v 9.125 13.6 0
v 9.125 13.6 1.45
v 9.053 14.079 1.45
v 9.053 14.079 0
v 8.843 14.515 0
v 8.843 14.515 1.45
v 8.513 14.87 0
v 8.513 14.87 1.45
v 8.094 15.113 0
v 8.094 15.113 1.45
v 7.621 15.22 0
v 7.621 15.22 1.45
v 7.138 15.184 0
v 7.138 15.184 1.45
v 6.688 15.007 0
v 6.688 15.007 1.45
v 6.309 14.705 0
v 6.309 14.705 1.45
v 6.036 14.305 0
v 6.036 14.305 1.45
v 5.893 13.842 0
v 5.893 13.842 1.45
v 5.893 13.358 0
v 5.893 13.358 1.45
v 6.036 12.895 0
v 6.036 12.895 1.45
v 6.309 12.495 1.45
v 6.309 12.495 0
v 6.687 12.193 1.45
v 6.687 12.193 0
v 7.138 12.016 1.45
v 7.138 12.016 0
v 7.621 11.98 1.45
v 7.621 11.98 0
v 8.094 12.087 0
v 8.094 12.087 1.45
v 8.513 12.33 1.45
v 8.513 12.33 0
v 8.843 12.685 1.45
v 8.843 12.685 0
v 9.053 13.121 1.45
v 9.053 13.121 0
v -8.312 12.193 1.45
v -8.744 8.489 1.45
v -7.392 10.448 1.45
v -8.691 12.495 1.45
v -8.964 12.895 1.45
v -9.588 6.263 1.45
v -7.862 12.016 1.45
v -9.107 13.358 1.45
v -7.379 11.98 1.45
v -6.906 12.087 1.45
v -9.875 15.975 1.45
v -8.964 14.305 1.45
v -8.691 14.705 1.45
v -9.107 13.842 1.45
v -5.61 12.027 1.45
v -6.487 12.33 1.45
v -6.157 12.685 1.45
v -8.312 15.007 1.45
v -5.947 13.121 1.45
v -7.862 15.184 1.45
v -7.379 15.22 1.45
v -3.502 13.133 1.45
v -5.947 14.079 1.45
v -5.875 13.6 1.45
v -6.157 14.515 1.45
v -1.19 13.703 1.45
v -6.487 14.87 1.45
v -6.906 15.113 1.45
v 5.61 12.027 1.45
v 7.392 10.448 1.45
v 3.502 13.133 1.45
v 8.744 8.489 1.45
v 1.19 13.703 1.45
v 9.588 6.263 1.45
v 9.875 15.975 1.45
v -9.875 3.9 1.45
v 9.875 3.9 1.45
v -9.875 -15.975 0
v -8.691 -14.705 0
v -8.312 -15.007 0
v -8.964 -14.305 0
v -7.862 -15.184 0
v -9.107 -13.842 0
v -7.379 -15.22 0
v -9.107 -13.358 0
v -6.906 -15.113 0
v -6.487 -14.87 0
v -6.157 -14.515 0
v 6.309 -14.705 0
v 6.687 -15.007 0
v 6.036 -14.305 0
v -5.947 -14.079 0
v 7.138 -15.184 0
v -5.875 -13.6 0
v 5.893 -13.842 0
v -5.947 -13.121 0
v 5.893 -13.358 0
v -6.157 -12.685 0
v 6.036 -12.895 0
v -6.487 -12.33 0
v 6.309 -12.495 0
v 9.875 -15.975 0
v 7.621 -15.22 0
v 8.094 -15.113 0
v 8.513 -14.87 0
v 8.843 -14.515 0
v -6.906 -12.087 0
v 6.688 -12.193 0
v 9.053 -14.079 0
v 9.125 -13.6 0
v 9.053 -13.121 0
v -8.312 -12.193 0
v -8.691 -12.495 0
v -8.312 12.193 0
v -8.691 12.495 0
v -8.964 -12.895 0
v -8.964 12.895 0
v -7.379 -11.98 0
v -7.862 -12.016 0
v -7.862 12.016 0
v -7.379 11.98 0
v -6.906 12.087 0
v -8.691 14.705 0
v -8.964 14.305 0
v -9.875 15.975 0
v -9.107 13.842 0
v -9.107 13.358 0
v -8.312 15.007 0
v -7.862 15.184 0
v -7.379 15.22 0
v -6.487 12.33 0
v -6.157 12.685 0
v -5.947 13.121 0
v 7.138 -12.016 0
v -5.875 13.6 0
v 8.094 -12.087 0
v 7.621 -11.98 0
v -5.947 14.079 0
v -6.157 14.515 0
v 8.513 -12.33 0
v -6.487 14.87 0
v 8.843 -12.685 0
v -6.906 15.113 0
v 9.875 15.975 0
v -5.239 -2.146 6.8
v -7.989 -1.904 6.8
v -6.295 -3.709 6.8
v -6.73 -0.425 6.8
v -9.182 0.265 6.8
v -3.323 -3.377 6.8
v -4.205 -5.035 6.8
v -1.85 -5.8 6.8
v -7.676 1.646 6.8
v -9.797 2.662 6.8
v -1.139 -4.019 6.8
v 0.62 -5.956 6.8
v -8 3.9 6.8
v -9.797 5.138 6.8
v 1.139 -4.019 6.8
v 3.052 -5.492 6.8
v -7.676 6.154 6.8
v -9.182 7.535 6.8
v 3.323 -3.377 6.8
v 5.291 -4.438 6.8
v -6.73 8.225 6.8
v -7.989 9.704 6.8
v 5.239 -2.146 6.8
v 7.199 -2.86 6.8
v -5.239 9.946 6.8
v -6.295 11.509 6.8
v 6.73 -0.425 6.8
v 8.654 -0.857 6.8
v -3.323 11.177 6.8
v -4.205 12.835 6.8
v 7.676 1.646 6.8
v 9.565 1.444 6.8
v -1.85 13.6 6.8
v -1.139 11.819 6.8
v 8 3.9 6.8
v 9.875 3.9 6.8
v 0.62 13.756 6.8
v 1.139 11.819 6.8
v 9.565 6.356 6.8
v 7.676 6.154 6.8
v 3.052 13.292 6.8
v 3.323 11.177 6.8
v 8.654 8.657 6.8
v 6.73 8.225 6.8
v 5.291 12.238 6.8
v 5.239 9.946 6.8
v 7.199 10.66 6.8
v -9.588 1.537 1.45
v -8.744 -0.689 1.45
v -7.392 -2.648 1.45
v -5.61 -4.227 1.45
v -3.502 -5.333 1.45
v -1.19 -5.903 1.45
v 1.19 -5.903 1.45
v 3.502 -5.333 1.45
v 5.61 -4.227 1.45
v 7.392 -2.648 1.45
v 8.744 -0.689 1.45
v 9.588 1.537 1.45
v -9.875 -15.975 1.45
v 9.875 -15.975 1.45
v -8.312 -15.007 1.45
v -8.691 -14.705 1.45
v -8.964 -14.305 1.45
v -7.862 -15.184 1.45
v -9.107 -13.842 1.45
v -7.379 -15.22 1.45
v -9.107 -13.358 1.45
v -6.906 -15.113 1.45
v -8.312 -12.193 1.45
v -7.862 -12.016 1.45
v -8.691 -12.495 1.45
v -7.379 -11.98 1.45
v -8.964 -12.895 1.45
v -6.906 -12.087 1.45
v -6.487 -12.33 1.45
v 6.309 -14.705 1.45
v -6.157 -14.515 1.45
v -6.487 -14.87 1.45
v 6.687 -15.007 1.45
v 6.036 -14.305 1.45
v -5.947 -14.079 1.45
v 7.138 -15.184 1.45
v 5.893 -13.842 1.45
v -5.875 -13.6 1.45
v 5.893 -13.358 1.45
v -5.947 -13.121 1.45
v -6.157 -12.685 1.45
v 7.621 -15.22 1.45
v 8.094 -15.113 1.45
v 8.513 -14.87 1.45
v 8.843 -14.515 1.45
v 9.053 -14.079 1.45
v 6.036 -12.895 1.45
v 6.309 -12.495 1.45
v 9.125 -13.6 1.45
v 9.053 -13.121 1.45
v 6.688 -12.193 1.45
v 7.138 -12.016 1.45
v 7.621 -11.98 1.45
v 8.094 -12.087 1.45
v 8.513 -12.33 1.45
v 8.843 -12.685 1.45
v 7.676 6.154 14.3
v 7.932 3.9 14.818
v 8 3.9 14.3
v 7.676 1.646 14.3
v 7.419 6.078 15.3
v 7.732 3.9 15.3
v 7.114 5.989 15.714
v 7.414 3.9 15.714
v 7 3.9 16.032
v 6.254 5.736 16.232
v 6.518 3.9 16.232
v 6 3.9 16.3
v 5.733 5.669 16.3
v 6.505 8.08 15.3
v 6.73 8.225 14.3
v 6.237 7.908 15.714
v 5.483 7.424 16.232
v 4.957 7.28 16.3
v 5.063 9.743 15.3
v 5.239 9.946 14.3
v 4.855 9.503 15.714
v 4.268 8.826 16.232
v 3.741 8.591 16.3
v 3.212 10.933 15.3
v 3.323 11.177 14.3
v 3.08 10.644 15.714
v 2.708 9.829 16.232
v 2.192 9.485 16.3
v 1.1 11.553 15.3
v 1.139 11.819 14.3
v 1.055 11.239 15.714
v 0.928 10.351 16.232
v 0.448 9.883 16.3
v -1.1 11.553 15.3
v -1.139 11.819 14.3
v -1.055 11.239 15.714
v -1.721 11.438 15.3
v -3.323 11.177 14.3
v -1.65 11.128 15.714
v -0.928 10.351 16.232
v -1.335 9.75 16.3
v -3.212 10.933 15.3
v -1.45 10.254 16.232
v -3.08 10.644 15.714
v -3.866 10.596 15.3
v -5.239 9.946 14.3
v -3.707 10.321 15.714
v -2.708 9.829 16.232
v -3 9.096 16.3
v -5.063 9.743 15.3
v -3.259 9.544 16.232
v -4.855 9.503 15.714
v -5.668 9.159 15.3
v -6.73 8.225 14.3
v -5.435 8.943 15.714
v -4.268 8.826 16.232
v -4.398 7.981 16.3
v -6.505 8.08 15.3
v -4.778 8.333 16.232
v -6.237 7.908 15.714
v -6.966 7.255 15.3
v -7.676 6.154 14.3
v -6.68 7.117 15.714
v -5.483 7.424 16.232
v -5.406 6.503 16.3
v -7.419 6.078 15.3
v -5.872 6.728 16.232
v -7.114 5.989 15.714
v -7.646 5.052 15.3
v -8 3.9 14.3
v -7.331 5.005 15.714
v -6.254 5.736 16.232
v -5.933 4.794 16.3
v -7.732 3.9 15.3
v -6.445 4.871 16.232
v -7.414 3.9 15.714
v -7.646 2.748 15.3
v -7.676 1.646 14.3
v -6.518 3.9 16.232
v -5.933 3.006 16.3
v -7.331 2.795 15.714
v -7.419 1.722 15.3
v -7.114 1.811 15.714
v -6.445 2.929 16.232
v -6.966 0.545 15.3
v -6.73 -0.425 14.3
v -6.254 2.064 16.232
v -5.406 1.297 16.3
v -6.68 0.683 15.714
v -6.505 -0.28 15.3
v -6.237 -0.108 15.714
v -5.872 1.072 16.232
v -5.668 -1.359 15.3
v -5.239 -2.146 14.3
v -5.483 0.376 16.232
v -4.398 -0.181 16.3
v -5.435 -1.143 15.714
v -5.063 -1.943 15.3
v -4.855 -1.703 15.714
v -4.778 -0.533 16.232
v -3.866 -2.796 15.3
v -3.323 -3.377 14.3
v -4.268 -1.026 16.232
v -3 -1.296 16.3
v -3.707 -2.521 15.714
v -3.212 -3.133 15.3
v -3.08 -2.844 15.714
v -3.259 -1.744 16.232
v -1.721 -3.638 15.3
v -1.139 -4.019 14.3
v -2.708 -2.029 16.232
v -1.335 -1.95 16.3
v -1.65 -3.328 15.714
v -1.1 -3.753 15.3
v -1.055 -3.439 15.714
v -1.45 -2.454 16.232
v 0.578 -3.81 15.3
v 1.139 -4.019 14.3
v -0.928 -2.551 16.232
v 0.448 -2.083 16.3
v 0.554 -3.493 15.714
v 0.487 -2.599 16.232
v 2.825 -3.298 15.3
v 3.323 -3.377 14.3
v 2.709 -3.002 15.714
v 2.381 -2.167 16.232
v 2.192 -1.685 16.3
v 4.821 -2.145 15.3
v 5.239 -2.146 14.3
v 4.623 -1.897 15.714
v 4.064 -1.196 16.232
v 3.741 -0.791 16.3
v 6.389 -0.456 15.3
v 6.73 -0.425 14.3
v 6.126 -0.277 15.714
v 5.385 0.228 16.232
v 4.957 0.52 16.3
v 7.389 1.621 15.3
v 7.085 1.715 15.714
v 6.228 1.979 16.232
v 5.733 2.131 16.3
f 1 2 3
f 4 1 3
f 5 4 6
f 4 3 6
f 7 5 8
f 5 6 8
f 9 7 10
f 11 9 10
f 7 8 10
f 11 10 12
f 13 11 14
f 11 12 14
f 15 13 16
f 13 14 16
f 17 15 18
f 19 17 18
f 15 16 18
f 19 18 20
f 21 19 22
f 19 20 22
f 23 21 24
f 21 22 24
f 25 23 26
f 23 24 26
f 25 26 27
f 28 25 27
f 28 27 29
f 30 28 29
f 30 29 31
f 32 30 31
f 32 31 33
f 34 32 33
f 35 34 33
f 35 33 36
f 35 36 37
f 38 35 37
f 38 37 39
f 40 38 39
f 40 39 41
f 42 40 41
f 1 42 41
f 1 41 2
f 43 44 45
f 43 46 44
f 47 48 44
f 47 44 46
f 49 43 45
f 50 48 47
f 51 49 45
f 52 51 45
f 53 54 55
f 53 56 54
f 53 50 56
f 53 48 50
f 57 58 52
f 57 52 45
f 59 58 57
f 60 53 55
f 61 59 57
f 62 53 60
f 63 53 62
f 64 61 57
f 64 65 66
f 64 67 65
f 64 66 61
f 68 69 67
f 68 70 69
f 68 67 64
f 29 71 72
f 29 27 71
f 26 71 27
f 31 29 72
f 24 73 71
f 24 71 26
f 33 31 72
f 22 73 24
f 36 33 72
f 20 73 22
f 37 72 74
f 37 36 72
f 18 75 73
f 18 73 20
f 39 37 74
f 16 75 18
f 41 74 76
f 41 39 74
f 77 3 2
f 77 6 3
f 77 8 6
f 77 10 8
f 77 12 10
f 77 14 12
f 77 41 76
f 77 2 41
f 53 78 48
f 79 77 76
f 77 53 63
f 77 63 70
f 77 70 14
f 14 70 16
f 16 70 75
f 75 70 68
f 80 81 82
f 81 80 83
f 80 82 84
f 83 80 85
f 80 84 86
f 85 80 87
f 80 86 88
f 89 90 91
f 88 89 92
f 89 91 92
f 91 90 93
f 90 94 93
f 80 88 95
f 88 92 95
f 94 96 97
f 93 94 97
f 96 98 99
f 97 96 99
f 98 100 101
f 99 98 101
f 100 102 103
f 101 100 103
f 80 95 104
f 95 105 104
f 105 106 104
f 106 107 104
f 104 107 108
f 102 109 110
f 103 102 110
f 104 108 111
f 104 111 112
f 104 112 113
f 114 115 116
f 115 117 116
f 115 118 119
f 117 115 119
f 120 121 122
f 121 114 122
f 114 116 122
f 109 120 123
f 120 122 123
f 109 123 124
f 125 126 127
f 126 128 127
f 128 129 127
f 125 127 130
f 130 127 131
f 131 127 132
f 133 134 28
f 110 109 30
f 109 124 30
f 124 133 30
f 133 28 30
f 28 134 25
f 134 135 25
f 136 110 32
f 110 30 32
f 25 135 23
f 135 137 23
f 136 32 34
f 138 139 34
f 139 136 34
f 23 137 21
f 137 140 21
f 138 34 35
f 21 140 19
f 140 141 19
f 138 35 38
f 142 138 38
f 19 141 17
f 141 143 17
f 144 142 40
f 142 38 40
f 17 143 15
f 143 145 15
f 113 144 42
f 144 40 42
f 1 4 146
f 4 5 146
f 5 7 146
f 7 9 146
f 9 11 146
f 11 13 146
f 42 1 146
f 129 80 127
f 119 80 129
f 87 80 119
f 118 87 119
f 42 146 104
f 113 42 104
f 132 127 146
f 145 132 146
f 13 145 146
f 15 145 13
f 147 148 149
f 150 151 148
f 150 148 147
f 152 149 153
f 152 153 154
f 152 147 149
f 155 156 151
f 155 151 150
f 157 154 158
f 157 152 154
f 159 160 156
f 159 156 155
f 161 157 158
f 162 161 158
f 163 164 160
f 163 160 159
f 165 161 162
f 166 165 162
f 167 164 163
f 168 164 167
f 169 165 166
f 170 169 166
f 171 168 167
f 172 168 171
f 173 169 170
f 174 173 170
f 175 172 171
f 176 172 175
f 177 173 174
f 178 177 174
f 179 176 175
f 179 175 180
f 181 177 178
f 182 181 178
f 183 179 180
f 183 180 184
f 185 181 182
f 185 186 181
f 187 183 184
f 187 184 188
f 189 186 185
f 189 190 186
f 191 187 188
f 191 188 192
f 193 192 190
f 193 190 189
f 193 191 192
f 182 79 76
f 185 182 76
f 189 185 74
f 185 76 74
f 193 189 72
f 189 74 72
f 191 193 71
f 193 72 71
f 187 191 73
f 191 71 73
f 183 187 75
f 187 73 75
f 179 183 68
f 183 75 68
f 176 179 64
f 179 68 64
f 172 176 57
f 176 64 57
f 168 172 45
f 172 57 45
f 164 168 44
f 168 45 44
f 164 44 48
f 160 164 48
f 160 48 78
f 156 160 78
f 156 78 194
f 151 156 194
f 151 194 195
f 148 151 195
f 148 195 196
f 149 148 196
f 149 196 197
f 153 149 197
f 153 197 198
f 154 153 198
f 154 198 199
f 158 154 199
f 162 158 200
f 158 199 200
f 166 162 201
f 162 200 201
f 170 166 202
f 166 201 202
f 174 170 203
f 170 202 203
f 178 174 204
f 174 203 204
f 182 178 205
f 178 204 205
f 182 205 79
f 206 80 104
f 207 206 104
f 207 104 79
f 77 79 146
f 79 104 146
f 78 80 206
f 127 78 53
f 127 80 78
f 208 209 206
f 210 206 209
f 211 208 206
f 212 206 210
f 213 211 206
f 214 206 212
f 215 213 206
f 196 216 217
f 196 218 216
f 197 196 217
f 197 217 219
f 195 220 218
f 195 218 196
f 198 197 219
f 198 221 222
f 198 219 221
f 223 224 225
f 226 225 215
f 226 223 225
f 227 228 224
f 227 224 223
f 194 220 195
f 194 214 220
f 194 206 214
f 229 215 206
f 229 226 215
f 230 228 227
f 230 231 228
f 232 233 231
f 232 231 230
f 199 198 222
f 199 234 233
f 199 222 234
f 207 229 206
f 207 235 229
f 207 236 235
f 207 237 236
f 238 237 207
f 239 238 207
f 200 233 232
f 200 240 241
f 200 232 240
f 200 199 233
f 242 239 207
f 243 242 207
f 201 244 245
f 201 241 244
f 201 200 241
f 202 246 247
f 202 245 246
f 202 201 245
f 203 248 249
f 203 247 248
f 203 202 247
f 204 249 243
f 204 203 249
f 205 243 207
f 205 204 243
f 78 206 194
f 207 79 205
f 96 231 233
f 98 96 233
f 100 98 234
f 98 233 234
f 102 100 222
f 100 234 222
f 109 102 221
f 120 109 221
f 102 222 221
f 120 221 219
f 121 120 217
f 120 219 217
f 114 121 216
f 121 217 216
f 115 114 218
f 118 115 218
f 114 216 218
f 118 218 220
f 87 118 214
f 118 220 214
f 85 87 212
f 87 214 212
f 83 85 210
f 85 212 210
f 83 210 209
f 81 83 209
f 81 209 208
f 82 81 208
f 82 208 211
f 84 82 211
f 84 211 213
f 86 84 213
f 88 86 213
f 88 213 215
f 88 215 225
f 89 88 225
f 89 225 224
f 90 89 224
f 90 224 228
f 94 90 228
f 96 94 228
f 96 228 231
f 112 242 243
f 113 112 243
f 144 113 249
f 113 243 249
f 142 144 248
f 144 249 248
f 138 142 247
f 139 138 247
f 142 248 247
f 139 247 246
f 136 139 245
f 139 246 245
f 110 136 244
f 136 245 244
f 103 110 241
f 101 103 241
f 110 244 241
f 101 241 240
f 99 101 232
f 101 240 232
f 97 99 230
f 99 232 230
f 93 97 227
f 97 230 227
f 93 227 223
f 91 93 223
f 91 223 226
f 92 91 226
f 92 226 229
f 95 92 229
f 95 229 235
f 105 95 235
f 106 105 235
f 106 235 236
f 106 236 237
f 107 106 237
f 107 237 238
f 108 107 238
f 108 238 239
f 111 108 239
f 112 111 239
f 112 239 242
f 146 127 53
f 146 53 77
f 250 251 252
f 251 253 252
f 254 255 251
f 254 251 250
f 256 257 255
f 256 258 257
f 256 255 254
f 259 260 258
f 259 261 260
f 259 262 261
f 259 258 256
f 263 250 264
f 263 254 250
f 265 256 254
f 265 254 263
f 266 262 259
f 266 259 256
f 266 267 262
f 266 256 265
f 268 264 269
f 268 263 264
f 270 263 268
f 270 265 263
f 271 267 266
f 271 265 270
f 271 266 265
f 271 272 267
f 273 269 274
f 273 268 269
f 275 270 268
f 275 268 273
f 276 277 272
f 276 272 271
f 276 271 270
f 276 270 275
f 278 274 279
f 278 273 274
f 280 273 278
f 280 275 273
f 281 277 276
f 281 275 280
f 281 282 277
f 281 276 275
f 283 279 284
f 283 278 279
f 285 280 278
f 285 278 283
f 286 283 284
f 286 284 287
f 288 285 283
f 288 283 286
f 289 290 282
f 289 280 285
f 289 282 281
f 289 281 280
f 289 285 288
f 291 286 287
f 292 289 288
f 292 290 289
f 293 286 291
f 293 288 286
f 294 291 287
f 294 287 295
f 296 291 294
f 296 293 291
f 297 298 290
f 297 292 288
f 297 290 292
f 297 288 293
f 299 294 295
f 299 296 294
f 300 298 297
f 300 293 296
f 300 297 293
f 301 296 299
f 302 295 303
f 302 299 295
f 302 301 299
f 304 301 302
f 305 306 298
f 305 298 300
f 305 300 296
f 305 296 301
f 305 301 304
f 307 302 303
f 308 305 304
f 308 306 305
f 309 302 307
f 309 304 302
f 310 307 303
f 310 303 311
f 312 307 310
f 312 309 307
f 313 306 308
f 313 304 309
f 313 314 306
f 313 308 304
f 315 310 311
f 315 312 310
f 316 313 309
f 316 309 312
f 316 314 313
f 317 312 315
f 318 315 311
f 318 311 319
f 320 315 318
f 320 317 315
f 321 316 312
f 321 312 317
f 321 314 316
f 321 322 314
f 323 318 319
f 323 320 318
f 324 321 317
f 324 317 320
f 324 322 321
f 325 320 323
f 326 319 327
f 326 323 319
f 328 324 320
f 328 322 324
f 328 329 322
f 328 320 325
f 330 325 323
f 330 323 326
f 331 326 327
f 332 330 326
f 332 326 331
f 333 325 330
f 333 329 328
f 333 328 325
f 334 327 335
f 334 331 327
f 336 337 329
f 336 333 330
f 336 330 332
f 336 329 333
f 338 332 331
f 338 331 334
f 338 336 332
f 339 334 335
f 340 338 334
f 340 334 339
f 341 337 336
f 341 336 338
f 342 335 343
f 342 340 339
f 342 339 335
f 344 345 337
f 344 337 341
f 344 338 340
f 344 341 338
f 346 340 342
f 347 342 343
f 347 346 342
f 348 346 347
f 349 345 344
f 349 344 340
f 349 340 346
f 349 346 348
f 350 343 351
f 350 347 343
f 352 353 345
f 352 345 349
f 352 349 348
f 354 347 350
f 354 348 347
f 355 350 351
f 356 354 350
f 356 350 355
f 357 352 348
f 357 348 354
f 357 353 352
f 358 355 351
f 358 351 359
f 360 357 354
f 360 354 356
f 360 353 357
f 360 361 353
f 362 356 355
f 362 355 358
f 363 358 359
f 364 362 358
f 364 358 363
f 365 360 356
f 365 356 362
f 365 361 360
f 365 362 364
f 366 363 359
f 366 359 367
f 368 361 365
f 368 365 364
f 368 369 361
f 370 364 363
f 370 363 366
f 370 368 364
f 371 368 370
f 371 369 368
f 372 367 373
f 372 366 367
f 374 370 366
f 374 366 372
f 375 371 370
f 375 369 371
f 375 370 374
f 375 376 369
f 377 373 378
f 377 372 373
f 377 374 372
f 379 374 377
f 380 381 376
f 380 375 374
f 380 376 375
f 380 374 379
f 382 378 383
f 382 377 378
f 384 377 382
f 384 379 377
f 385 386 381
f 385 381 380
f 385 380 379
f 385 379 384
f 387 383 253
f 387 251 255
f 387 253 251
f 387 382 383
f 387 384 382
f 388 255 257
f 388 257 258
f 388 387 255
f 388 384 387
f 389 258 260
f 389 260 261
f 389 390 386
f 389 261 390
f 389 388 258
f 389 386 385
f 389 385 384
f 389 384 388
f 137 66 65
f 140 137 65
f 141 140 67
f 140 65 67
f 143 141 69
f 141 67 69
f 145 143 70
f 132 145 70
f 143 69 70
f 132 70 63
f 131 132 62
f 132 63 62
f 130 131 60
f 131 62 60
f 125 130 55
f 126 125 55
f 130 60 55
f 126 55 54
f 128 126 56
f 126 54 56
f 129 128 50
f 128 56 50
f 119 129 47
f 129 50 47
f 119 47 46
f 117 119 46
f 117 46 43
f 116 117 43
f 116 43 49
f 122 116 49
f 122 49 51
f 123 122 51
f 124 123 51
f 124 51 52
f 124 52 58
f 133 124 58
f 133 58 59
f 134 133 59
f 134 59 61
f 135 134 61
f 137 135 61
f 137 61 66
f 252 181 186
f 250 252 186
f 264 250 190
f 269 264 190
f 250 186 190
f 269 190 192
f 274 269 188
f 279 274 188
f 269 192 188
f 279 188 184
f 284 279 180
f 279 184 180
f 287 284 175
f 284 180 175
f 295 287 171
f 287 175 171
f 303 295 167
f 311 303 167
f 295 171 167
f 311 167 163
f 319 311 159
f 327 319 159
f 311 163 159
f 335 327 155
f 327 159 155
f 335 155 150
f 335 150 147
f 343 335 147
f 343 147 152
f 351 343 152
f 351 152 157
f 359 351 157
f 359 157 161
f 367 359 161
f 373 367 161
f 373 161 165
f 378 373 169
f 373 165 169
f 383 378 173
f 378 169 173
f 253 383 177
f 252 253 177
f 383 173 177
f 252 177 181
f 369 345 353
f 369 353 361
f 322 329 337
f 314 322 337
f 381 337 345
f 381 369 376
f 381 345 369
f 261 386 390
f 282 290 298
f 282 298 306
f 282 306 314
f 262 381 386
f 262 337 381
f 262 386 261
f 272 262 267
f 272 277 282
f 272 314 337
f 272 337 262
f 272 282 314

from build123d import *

# Parameters (mm, degrees)
SKETCH1_W           = 19.75
SKETCH1_H           = 31.95
BOSS_EXTRUDE1_DEPTH = 1.45
SKETCH2_R           = 1.625
CUT_EXTRUDE1_DEPTH  = 2.45
SKETCH3_R           = 9.875
BOSS_EXTRUDE2_DEPTH = 5.35
SKETCH4_R           = 8
BOSS_EXTRUDE3_DEPTH = 9.5
FILLET1_R           = 2


with BuildPart() as part:
    # Sketch1 → Boss-Extrude1 (new body)
    with BuildSketch(Plane.XY):
        Rectangle(SKETCH1_W, SKETCH1_H)
    extrude(amount=BOSS_EXTRUDE1_DEPTH)

    # Sketch2 → Cut-Extrude1 (cut, through all)
    with BuildSketch(Plane.XY.offset(1.45)):
        with Locations((-7.5, 13.6)):
            Circle(SKETCH2_R)
        with Locations((-7.5, -13.6)):
            Circle(SKETCH2_R)
        with Locations((7.5, -13.6)):
            Circle(SKETCH2_R)
        with Locations((7.5, 13.6)):
            Circle(SKETCH2_R)
    extrude(amount=-CUT_EXTRUDE1_DEPTH, mode=Mode.SUBTRACT)

    # Sketch3 → Boss-Extrude2 (add)
    with BuildSketch(Plane.XY.offset(1.45)):
        with Locations((0, 3.9)):
            Circle(SKETCH3_R)
    extrude(amount=BOSS_EXTRUDE2_DEPTH)

    # Sketch4 → Boss-Extrude3 (add)
    with BuildSketch(Plane.XY.offset(6.8)):
        with Locations((0, 3.9)):
            Circle(SKETCH4_R)
    extrude(amount=BOSS_EXTRUDE3_DEPTH)

    # Fillet1
    fillet1_edges = [part.edges().sort_by_distance(p)[0] for p in [
        (-8, 3.9, 16.3),
    ]]
    fillet(fillet1_edges, radius=FILLET1_R)


solid = part.part
